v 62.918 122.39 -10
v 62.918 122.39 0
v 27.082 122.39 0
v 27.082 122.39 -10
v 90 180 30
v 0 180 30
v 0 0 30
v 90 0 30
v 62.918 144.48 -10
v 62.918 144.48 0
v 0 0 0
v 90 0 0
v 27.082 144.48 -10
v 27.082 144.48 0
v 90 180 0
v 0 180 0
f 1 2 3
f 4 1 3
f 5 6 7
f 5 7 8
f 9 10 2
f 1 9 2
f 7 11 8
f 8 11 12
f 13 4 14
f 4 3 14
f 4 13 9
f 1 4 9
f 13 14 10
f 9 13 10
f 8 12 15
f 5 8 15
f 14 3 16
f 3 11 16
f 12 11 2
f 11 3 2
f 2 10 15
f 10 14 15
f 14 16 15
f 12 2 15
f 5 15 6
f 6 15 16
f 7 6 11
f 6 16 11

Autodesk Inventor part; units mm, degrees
ref_plane "YZ Plane" through (0, 0, 0) normal (1, 0, 0) x (0, 1, 0)
ref_plane "XZ Plane" through (0, 0, 0) normal (0, 1, 0) x (-1, 0, 0)
ref_plane "XY Plane" through (0, 0, 0) normal (0, 0, 1) x (1, 0, 0)
sketch "Boceto1" plane through (0, 0, 0) normal (0, 0, 1) x (1, 0, 0)
  line L0 (0, 0) -> (90, 0)
  line L1 (90, 0) -> (90, 180)
  line L2 (90, 180) -> (0, 180)
  line L3 (0, 180) -> (0, 0)
  line L4 (27.082, 144.48) -> (62.918, 144.48)
  line L5 (62.918, 144.48) -> (62.918, 122.39)
  line L6 (62.918, 122.39) -> (27.082, 122.39)
  line L7 (27.082, 122.39) -> (27.082, 144.48)
  point P0 (45, 144.48)
  dimension "d0" = 180
  dimension "d1" = 90
  dimension "d2" = 35.52
  dimension "d3" = 22.09
  dimension "d4" = 35.836
  dimension "d5" = 45
sketch "Boceto2" plane through (0, 0, 0) normal (0, 0, 1) x (1, 0, 0)
  line L0 (0, 0) -> (90, 0)
  line L1 (90, 0) -> (90, 180)
  line L2 (90, 180) -> (0, 180)
  line L3 (0, 180) -> (0, 0)
  dimension "d6" = 90
  dimension "d7" = 180
extrude "Extrusión1" add sketch "Boceto2" along normal blind 30
extrude "Extrusión2" add sketch "Boceto1" against normal blind 10 contours L4 L5 L6 L7
properties part number "MoldeDerechoPiezaInferiorBarco"
